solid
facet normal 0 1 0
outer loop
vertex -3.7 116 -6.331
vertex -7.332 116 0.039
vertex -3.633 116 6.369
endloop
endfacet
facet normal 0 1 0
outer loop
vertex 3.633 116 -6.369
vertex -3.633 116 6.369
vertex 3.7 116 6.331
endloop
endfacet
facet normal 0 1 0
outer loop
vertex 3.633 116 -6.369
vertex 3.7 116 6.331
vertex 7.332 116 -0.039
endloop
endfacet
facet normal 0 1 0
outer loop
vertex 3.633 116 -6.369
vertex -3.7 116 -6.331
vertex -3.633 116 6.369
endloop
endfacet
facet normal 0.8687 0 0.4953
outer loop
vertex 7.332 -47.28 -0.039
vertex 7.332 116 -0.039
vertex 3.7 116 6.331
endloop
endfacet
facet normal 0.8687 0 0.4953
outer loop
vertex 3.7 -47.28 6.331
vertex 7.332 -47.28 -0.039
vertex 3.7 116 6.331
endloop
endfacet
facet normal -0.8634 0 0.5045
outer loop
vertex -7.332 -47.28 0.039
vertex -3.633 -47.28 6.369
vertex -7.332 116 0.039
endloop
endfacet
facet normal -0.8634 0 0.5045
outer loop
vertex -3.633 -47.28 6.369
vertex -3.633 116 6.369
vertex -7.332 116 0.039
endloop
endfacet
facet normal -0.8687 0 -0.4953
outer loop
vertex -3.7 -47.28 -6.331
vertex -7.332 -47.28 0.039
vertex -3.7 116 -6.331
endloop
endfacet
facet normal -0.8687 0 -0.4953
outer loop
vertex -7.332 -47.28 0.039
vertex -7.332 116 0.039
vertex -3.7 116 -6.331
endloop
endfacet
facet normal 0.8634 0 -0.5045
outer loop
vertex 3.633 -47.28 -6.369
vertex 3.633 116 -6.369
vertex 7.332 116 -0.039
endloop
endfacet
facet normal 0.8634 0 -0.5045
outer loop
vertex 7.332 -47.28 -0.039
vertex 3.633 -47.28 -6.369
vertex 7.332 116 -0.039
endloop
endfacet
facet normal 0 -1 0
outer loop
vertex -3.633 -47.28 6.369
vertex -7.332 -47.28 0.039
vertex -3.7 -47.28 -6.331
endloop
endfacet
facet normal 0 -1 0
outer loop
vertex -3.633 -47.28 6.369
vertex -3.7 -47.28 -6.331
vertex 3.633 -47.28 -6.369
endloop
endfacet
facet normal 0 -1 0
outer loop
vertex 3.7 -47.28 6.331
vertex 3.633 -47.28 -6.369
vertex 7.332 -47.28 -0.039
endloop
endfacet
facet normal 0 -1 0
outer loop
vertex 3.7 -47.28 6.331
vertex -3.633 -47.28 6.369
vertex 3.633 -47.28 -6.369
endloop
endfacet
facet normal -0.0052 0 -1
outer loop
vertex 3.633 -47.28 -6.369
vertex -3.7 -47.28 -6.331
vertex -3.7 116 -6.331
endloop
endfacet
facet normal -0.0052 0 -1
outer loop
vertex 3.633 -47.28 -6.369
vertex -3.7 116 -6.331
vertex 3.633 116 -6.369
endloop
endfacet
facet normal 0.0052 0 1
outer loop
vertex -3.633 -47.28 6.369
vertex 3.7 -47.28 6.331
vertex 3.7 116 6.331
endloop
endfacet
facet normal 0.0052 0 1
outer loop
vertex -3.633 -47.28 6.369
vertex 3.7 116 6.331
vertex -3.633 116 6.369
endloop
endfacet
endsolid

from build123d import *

# Parameters (mm, degrees)
SALIENTE_EXTRUIR1_DEPTH = 116
SALIENTE_EXTRUIR3_DEPTH = 47.28


with BuildPart() as part:
    # Croquis1 → Saliente-Extruir1 (new body)
    with BuildSketch(Plane(origin=(0, 0, 0), x_dir=(1, 0, 0), z_dir=(0, 1, 0))):
        Polygon((-3.632503467, -6.369321148), (3.699742186, -6.330500856), (7.332245653, 0.038820292), (3.632503467, 6.369321148), (-3.699742186, 6.330500856), (-7.332245653, -0.038820292), align=None)
    extrude(amount=SALIENTE_EXTRUIR1_DEPTH)

    # Croquis6 → Saliente-Extruir3 (add)
    with BuildSketch(Plane.XZ):
        Polygon((7.332245653, -0.038820292), (3.699742186, 6.330500856), (-3.632503467, 6.369321148), (-7.332245653, 0.038820292), (-3.699742186, -6.330500856), (3.632503467, -6.369321148), align=None)
    extrude(amount=SALIENTE_EXTRUIR3_DEPTH)


solid = part.part
